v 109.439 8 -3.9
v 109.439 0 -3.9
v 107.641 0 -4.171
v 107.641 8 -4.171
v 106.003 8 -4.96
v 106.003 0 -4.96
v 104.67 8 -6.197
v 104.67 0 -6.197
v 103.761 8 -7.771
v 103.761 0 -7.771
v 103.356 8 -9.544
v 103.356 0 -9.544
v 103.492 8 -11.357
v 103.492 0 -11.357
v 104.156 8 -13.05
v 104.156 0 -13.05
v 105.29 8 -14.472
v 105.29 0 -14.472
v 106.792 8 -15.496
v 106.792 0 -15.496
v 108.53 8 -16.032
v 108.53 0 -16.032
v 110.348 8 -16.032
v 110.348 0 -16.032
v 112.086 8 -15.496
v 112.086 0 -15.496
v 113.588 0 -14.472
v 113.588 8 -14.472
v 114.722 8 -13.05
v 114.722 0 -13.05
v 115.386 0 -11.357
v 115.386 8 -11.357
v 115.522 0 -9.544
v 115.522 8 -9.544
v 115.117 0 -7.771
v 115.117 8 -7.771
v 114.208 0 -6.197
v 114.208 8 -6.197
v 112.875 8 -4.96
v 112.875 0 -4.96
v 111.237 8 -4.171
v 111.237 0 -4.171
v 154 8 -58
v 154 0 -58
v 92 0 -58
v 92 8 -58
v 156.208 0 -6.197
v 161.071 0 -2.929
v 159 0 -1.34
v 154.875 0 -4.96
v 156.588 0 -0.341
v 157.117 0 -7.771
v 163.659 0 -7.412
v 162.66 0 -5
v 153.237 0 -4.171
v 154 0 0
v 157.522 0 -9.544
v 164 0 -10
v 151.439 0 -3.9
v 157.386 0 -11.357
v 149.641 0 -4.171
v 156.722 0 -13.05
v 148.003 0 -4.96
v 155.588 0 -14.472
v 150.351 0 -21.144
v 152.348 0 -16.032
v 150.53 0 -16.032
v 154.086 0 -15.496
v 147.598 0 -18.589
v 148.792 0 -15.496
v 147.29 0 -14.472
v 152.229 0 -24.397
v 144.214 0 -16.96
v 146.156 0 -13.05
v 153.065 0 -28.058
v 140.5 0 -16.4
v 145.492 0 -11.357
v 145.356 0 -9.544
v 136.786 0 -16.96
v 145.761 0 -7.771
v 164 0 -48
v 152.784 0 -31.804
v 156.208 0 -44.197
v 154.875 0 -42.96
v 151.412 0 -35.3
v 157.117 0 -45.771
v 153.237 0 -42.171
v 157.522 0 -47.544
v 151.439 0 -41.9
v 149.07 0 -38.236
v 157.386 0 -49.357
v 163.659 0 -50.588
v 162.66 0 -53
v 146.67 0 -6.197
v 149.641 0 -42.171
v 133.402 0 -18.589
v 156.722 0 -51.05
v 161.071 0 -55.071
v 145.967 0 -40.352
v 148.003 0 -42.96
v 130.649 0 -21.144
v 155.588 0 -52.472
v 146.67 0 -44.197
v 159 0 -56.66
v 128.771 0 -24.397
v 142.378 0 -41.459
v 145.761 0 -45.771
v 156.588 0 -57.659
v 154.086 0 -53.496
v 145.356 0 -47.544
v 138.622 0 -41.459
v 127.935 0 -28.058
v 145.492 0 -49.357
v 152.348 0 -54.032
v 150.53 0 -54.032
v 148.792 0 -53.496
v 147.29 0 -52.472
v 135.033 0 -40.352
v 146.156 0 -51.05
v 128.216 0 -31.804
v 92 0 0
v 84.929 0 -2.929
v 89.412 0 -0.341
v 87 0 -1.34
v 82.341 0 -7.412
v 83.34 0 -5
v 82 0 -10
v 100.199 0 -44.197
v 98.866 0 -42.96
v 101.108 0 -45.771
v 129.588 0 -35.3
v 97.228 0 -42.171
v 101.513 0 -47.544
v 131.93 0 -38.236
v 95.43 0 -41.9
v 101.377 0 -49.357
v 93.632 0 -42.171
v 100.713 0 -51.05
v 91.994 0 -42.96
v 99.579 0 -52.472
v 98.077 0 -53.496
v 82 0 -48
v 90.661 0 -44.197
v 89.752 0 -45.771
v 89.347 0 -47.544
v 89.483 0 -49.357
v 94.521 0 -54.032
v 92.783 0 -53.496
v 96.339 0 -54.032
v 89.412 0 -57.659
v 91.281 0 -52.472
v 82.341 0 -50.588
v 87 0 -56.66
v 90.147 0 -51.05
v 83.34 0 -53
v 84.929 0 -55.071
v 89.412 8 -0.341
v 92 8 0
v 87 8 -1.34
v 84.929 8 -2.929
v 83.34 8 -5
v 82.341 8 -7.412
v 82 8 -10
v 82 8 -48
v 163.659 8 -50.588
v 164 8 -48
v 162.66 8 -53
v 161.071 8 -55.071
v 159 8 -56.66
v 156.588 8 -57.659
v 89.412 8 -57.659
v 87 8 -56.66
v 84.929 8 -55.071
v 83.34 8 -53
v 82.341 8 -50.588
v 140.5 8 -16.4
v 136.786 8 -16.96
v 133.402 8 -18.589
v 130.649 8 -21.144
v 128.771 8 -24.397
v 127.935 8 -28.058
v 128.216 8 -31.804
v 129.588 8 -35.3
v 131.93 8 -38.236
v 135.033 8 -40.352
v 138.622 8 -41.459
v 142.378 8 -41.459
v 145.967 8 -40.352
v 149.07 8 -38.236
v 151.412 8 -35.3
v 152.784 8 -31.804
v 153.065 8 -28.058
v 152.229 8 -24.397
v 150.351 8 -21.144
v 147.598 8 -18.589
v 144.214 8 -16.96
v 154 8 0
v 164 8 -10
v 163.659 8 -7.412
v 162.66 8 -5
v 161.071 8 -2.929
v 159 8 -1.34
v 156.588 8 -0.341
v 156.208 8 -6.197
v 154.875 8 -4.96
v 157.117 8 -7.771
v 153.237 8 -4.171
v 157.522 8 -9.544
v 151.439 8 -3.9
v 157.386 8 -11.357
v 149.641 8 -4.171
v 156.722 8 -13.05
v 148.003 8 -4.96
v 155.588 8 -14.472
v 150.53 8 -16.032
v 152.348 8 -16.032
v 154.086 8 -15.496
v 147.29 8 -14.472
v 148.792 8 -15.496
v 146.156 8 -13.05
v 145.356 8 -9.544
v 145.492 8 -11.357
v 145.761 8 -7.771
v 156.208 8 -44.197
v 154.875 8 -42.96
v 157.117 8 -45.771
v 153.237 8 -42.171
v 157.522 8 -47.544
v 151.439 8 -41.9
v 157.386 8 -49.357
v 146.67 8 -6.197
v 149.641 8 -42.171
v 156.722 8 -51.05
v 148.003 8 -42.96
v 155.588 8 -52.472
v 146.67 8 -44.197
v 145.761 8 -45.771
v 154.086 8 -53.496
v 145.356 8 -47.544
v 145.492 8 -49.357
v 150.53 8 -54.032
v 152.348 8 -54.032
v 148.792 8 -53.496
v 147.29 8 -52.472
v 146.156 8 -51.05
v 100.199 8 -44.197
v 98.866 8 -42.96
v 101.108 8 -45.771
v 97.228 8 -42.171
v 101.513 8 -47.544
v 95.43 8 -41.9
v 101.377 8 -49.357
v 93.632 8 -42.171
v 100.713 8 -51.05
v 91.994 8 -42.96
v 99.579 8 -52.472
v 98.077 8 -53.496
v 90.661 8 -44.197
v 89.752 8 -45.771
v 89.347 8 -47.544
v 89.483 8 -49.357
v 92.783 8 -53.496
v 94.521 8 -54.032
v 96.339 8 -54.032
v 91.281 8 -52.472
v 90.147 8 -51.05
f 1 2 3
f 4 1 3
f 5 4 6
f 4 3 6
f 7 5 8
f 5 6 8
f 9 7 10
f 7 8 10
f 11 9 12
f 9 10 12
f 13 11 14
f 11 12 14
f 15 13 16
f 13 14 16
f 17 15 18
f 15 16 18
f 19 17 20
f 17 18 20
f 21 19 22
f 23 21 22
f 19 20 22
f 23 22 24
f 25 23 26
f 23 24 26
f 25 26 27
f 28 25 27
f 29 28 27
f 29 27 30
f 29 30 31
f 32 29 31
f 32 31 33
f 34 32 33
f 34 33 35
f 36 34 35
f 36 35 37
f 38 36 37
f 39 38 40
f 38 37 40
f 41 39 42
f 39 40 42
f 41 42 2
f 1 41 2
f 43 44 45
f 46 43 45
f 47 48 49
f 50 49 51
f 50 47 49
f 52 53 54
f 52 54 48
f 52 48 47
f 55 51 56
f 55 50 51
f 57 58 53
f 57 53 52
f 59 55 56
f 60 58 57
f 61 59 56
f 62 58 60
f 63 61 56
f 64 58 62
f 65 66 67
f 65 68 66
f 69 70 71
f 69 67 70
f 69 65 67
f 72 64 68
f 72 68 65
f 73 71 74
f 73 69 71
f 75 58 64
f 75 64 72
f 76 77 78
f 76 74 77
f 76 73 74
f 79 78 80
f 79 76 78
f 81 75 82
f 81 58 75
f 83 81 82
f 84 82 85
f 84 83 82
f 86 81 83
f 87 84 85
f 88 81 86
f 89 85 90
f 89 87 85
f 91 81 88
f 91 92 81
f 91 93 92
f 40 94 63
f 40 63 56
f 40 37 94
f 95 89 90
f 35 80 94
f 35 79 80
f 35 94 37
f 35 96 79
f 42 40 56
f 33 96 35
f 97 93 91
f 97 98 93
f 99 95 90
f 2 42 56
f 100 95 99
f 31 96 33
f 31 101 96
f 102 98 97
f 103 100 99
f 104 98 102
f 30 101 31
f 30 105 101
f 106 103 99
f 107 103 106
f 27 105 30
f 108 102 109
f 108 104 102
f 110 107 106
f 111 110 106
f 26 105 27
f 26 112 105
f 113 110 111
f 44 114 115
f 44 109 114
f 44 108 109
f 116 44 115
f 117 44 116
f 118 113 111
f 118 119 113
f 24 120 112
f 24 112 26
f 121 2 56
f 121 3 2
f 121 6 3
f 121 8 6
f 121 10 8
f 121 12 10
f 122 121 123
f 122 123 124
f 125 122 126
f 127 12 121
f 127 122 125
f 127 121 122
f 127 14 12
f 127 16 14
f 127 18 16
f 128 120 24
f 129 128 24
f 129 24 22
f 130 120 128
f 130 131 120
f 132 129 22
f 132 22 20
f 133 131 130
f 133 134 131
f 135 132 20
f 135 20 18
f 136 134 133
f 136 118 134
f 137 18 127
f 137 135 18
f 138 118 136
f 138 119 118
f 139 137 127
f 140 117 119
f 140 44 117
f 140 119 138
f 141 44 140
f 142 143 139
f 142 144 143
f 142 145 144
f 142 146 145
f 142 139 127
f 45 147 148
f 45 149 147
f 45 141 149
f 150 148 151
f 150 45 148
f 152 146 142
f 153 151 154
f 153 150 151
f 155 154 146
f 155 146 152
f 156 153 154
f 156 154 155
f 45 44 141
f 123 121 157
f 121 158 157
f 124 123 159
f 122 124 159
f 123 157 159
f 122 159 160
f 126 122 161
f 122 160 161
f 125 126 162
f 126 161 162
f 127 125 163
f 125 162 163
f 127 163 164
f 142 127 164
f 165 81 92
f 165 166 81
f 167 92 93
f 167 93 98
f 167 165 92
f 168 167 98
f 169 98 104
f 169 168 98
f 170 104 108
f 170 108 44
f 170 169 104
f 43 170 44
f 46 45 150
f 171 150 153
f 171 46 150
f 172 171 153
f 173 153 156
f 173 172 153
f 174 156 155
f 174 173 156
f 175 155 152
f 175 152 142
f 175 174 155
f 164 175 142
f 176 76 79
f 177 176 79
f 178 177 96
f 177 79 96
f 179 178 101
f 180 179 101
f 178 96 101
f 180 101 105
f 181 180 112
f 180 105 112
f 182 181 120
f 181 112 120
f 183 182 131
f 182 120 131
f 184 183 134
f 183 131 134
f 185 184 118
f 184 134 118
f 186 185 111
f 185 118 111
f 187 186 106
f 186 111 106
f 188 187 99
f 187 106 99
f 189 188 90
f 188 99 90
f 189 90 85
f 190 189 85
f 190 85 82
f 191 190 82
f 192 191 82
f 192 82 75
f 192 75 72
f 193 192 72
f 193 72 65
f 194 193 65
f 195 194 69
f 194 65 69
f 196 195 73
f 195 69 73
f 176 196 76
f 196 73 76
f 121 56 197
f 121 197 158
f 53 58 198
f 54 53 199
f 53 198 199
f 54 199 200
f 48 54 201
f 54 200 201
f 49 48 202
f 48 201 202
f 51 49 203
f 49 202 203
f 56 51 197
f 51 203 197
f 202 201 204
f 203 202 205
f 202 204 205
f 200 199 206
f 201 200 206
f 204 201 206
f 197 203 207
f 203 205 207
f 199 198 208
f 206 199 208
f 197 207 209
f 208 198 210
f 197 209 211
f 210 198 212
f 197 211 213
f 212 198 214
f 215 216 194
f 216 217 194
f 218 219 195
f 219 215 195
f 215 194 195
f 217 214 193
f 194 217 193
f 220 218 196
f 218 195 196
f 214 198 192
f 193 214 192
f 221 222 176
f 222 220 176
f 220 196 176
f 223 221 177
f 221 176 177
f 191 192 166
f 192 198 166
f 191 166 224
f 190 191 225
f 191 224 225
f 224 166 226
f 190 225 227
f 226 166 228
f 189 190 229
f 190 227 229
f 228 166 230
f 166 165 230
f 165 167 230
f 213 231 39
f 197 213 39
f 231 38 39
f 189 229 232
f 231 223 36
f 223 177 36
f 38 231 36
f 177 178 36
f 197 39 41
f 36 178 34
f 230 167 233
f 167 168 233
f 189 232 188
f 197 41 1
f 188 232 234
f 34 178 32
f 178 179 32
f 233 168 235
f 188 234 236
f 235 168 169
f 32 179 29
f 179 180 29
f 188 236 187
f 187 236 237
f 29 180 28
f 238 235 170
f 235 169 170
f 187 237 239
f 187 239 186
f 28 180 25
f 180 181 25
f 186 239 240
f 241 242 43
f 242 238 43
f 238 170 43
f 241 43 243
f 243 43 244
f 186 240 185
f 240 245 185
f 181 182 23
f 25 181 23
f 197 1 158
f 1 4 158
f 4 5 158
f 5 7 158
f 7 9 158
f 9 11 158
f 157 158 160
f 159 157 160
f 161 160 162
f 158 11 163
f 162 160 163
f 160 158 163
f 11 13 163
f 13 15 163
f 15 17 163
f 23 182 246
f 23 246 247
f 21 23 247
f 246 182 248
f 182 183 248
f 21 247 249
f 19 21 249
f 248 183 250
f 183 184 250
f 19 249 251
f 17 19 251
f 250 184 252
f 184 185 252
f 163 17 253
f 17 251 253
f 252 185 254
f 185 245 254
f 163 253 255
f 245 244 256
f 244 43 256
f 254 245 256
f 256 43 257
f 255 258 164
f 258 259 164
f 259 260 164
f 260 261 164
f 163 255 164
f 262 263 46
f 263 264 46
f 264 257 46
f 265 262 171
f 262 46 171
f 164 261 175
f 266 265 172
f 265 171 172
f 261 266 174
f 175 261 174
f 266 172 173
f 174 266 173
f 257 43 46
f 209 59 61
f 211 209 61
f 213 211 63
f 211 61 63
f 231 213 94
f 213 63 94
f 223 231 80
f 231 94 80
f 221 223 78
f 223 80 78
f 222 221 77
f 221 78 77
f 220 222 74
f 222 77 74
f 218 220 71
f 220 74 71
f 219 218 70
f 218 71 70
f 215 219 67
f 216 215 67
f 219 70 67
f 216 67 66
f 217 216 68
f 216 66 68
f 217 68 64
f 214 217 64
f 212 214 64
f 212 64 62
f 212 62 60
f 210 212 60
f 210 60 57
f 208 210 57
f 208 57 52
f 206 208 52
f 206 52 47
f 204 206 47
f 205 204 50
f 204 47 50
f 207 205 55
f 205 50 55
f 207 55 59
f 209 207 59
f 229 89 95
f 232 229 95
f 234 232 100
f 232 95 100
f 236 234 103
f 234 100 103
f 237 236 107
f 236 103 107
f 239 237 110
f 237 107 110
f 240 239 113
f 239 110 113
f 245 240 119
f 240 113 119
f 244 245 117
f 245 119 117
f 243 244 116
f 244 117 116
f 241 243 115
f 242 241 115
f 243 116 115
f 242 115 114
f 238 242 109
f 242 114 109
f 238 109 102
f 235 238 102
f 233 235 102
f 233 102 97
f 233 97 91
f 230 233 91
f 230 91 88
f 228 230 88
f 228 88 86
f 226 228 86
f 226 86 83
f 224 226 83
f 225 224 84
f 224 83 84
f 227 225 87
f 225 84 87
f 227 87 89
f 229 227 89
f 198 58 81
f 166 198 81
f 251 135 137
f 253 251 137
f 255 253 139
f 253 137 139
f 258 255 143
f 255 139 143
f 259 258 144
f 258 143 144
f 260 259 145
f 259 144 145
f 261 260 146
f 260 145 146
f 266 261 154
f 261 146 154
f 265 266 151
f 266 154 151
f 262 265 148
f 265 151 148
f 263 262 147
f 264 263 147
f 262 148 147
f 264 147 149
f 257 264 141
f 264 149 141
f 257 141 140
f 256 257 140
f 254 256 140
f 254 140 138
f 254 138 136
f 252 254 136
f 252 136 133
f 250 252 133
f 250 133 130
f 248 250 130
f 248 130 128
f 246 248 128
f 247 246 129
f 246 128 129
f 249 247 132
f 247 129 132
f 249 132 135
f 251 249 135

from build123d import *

# Parameters (mm, degrees)
SKETCH1_W            = 82
SKETCH1_H            = 58
SKETCH1_R            = 12.6
SKETCH1_R_2          = 6.1
BOSS_EXTRUDE1_DEPTH  = 8
FILLET1_R            = 10
FILLET1_OF_MIRROR1_R = 10
SKETCH2_W            = 82
SKETCH2_H            = 58
CUT_EXTRUDE1_DEPTH   = 175.137876408


with BuildPart() as part:
    # Sketch1 → Boss-Extrude1 (new body)
    with BuildSketch(Plane(origin=(0, 0, 0), x_dir=(1, 0, 0), z_dir=(0, 1, 0))):
        with Locations((41, 29)):
            Rectangle(SKETCH1_W, SKETCH1_H)
        with Locations(Location((23.5, 29, 0), (0, 0, 270))):
            Circle(SKETCH1_R, mode=Mode.SUBTRACT)
        with Locations(Location((68.57, 48, 0), (0, 0, 270))):
            Circle(SKETCH1_R_2, mode=Mode.SUBTRACT)
        with Locations(Location((54.561074274, 10, 0), (0, 0, 270))):
            Circle(SKETCH1_R_2, mode=Mode.SUBTRACT)
        with Locations(Location((12.561074274, 10, 0), (0, 0, 270))):
            Circle(SKETCH1_R_2, mode=Mode.SUBTRACT)
        with Locations(Location((12.561074274, 48, 0), (0, 0, 270))):
            Circle(SKETCH1_R_2, mode=Mode.SUBTRACT)
    boss_extrude1 = extrude(amount=BOSS_EXTRUDE1_DEPTH)

    # Fillet1
    fillet1_edges = [part.edges().sort_by_distance(p)[0] for p in [
        (0, 4, 0),
        (0, 4, -58),
        (82, 4, -58),
        (82, 4, 0),
    ]]
    fillet(fillet1_edges, radius=FILLET1_R)


with BuildPart() as mirror1_1:
    # Mirror1: Boss-Extrude1 across plane
    add(boss_extrude1.mirror(Plane(origin=(82, 8, 0), x_dir=(0, 0, 1), z_dir=(-1, 0, 0))))

    # Fillet1 of Mirror1
    fillet1_of_mirror1_edges = [mirror1_1.edges().sort_by_distance(p)[0] for p in [
        (164, 4, 0),
        (164, 4, -58),
        (82, 4, -58),
        (82, 4, 0),
    ]]
    fillet(fillet1_of_mirror1_edges, radius=FILLET1_OF_MIRROR1_R)


with BuildPart() as part_1:
    add(part.part)

    # Mirror1 united with what the copies touc: union Mirror1_1
    add(mirror1_1.part)

    # Sketch2 → Cut-Extrude1 (cut, through all)
    with BuildSketch(Plane(origin=(0, 8, 0), x_dir=(1, 0, 0), z_dir=(0, 1, 0))):
        with Locations((41, 29)):
            Rectangle(SKETCH2_W, SKETCH2_H)
    extrude(amount=-CUT_EXTRUDE1_DEPTH, mode=Mode.SUBTRACT)


solid = part_1.part
